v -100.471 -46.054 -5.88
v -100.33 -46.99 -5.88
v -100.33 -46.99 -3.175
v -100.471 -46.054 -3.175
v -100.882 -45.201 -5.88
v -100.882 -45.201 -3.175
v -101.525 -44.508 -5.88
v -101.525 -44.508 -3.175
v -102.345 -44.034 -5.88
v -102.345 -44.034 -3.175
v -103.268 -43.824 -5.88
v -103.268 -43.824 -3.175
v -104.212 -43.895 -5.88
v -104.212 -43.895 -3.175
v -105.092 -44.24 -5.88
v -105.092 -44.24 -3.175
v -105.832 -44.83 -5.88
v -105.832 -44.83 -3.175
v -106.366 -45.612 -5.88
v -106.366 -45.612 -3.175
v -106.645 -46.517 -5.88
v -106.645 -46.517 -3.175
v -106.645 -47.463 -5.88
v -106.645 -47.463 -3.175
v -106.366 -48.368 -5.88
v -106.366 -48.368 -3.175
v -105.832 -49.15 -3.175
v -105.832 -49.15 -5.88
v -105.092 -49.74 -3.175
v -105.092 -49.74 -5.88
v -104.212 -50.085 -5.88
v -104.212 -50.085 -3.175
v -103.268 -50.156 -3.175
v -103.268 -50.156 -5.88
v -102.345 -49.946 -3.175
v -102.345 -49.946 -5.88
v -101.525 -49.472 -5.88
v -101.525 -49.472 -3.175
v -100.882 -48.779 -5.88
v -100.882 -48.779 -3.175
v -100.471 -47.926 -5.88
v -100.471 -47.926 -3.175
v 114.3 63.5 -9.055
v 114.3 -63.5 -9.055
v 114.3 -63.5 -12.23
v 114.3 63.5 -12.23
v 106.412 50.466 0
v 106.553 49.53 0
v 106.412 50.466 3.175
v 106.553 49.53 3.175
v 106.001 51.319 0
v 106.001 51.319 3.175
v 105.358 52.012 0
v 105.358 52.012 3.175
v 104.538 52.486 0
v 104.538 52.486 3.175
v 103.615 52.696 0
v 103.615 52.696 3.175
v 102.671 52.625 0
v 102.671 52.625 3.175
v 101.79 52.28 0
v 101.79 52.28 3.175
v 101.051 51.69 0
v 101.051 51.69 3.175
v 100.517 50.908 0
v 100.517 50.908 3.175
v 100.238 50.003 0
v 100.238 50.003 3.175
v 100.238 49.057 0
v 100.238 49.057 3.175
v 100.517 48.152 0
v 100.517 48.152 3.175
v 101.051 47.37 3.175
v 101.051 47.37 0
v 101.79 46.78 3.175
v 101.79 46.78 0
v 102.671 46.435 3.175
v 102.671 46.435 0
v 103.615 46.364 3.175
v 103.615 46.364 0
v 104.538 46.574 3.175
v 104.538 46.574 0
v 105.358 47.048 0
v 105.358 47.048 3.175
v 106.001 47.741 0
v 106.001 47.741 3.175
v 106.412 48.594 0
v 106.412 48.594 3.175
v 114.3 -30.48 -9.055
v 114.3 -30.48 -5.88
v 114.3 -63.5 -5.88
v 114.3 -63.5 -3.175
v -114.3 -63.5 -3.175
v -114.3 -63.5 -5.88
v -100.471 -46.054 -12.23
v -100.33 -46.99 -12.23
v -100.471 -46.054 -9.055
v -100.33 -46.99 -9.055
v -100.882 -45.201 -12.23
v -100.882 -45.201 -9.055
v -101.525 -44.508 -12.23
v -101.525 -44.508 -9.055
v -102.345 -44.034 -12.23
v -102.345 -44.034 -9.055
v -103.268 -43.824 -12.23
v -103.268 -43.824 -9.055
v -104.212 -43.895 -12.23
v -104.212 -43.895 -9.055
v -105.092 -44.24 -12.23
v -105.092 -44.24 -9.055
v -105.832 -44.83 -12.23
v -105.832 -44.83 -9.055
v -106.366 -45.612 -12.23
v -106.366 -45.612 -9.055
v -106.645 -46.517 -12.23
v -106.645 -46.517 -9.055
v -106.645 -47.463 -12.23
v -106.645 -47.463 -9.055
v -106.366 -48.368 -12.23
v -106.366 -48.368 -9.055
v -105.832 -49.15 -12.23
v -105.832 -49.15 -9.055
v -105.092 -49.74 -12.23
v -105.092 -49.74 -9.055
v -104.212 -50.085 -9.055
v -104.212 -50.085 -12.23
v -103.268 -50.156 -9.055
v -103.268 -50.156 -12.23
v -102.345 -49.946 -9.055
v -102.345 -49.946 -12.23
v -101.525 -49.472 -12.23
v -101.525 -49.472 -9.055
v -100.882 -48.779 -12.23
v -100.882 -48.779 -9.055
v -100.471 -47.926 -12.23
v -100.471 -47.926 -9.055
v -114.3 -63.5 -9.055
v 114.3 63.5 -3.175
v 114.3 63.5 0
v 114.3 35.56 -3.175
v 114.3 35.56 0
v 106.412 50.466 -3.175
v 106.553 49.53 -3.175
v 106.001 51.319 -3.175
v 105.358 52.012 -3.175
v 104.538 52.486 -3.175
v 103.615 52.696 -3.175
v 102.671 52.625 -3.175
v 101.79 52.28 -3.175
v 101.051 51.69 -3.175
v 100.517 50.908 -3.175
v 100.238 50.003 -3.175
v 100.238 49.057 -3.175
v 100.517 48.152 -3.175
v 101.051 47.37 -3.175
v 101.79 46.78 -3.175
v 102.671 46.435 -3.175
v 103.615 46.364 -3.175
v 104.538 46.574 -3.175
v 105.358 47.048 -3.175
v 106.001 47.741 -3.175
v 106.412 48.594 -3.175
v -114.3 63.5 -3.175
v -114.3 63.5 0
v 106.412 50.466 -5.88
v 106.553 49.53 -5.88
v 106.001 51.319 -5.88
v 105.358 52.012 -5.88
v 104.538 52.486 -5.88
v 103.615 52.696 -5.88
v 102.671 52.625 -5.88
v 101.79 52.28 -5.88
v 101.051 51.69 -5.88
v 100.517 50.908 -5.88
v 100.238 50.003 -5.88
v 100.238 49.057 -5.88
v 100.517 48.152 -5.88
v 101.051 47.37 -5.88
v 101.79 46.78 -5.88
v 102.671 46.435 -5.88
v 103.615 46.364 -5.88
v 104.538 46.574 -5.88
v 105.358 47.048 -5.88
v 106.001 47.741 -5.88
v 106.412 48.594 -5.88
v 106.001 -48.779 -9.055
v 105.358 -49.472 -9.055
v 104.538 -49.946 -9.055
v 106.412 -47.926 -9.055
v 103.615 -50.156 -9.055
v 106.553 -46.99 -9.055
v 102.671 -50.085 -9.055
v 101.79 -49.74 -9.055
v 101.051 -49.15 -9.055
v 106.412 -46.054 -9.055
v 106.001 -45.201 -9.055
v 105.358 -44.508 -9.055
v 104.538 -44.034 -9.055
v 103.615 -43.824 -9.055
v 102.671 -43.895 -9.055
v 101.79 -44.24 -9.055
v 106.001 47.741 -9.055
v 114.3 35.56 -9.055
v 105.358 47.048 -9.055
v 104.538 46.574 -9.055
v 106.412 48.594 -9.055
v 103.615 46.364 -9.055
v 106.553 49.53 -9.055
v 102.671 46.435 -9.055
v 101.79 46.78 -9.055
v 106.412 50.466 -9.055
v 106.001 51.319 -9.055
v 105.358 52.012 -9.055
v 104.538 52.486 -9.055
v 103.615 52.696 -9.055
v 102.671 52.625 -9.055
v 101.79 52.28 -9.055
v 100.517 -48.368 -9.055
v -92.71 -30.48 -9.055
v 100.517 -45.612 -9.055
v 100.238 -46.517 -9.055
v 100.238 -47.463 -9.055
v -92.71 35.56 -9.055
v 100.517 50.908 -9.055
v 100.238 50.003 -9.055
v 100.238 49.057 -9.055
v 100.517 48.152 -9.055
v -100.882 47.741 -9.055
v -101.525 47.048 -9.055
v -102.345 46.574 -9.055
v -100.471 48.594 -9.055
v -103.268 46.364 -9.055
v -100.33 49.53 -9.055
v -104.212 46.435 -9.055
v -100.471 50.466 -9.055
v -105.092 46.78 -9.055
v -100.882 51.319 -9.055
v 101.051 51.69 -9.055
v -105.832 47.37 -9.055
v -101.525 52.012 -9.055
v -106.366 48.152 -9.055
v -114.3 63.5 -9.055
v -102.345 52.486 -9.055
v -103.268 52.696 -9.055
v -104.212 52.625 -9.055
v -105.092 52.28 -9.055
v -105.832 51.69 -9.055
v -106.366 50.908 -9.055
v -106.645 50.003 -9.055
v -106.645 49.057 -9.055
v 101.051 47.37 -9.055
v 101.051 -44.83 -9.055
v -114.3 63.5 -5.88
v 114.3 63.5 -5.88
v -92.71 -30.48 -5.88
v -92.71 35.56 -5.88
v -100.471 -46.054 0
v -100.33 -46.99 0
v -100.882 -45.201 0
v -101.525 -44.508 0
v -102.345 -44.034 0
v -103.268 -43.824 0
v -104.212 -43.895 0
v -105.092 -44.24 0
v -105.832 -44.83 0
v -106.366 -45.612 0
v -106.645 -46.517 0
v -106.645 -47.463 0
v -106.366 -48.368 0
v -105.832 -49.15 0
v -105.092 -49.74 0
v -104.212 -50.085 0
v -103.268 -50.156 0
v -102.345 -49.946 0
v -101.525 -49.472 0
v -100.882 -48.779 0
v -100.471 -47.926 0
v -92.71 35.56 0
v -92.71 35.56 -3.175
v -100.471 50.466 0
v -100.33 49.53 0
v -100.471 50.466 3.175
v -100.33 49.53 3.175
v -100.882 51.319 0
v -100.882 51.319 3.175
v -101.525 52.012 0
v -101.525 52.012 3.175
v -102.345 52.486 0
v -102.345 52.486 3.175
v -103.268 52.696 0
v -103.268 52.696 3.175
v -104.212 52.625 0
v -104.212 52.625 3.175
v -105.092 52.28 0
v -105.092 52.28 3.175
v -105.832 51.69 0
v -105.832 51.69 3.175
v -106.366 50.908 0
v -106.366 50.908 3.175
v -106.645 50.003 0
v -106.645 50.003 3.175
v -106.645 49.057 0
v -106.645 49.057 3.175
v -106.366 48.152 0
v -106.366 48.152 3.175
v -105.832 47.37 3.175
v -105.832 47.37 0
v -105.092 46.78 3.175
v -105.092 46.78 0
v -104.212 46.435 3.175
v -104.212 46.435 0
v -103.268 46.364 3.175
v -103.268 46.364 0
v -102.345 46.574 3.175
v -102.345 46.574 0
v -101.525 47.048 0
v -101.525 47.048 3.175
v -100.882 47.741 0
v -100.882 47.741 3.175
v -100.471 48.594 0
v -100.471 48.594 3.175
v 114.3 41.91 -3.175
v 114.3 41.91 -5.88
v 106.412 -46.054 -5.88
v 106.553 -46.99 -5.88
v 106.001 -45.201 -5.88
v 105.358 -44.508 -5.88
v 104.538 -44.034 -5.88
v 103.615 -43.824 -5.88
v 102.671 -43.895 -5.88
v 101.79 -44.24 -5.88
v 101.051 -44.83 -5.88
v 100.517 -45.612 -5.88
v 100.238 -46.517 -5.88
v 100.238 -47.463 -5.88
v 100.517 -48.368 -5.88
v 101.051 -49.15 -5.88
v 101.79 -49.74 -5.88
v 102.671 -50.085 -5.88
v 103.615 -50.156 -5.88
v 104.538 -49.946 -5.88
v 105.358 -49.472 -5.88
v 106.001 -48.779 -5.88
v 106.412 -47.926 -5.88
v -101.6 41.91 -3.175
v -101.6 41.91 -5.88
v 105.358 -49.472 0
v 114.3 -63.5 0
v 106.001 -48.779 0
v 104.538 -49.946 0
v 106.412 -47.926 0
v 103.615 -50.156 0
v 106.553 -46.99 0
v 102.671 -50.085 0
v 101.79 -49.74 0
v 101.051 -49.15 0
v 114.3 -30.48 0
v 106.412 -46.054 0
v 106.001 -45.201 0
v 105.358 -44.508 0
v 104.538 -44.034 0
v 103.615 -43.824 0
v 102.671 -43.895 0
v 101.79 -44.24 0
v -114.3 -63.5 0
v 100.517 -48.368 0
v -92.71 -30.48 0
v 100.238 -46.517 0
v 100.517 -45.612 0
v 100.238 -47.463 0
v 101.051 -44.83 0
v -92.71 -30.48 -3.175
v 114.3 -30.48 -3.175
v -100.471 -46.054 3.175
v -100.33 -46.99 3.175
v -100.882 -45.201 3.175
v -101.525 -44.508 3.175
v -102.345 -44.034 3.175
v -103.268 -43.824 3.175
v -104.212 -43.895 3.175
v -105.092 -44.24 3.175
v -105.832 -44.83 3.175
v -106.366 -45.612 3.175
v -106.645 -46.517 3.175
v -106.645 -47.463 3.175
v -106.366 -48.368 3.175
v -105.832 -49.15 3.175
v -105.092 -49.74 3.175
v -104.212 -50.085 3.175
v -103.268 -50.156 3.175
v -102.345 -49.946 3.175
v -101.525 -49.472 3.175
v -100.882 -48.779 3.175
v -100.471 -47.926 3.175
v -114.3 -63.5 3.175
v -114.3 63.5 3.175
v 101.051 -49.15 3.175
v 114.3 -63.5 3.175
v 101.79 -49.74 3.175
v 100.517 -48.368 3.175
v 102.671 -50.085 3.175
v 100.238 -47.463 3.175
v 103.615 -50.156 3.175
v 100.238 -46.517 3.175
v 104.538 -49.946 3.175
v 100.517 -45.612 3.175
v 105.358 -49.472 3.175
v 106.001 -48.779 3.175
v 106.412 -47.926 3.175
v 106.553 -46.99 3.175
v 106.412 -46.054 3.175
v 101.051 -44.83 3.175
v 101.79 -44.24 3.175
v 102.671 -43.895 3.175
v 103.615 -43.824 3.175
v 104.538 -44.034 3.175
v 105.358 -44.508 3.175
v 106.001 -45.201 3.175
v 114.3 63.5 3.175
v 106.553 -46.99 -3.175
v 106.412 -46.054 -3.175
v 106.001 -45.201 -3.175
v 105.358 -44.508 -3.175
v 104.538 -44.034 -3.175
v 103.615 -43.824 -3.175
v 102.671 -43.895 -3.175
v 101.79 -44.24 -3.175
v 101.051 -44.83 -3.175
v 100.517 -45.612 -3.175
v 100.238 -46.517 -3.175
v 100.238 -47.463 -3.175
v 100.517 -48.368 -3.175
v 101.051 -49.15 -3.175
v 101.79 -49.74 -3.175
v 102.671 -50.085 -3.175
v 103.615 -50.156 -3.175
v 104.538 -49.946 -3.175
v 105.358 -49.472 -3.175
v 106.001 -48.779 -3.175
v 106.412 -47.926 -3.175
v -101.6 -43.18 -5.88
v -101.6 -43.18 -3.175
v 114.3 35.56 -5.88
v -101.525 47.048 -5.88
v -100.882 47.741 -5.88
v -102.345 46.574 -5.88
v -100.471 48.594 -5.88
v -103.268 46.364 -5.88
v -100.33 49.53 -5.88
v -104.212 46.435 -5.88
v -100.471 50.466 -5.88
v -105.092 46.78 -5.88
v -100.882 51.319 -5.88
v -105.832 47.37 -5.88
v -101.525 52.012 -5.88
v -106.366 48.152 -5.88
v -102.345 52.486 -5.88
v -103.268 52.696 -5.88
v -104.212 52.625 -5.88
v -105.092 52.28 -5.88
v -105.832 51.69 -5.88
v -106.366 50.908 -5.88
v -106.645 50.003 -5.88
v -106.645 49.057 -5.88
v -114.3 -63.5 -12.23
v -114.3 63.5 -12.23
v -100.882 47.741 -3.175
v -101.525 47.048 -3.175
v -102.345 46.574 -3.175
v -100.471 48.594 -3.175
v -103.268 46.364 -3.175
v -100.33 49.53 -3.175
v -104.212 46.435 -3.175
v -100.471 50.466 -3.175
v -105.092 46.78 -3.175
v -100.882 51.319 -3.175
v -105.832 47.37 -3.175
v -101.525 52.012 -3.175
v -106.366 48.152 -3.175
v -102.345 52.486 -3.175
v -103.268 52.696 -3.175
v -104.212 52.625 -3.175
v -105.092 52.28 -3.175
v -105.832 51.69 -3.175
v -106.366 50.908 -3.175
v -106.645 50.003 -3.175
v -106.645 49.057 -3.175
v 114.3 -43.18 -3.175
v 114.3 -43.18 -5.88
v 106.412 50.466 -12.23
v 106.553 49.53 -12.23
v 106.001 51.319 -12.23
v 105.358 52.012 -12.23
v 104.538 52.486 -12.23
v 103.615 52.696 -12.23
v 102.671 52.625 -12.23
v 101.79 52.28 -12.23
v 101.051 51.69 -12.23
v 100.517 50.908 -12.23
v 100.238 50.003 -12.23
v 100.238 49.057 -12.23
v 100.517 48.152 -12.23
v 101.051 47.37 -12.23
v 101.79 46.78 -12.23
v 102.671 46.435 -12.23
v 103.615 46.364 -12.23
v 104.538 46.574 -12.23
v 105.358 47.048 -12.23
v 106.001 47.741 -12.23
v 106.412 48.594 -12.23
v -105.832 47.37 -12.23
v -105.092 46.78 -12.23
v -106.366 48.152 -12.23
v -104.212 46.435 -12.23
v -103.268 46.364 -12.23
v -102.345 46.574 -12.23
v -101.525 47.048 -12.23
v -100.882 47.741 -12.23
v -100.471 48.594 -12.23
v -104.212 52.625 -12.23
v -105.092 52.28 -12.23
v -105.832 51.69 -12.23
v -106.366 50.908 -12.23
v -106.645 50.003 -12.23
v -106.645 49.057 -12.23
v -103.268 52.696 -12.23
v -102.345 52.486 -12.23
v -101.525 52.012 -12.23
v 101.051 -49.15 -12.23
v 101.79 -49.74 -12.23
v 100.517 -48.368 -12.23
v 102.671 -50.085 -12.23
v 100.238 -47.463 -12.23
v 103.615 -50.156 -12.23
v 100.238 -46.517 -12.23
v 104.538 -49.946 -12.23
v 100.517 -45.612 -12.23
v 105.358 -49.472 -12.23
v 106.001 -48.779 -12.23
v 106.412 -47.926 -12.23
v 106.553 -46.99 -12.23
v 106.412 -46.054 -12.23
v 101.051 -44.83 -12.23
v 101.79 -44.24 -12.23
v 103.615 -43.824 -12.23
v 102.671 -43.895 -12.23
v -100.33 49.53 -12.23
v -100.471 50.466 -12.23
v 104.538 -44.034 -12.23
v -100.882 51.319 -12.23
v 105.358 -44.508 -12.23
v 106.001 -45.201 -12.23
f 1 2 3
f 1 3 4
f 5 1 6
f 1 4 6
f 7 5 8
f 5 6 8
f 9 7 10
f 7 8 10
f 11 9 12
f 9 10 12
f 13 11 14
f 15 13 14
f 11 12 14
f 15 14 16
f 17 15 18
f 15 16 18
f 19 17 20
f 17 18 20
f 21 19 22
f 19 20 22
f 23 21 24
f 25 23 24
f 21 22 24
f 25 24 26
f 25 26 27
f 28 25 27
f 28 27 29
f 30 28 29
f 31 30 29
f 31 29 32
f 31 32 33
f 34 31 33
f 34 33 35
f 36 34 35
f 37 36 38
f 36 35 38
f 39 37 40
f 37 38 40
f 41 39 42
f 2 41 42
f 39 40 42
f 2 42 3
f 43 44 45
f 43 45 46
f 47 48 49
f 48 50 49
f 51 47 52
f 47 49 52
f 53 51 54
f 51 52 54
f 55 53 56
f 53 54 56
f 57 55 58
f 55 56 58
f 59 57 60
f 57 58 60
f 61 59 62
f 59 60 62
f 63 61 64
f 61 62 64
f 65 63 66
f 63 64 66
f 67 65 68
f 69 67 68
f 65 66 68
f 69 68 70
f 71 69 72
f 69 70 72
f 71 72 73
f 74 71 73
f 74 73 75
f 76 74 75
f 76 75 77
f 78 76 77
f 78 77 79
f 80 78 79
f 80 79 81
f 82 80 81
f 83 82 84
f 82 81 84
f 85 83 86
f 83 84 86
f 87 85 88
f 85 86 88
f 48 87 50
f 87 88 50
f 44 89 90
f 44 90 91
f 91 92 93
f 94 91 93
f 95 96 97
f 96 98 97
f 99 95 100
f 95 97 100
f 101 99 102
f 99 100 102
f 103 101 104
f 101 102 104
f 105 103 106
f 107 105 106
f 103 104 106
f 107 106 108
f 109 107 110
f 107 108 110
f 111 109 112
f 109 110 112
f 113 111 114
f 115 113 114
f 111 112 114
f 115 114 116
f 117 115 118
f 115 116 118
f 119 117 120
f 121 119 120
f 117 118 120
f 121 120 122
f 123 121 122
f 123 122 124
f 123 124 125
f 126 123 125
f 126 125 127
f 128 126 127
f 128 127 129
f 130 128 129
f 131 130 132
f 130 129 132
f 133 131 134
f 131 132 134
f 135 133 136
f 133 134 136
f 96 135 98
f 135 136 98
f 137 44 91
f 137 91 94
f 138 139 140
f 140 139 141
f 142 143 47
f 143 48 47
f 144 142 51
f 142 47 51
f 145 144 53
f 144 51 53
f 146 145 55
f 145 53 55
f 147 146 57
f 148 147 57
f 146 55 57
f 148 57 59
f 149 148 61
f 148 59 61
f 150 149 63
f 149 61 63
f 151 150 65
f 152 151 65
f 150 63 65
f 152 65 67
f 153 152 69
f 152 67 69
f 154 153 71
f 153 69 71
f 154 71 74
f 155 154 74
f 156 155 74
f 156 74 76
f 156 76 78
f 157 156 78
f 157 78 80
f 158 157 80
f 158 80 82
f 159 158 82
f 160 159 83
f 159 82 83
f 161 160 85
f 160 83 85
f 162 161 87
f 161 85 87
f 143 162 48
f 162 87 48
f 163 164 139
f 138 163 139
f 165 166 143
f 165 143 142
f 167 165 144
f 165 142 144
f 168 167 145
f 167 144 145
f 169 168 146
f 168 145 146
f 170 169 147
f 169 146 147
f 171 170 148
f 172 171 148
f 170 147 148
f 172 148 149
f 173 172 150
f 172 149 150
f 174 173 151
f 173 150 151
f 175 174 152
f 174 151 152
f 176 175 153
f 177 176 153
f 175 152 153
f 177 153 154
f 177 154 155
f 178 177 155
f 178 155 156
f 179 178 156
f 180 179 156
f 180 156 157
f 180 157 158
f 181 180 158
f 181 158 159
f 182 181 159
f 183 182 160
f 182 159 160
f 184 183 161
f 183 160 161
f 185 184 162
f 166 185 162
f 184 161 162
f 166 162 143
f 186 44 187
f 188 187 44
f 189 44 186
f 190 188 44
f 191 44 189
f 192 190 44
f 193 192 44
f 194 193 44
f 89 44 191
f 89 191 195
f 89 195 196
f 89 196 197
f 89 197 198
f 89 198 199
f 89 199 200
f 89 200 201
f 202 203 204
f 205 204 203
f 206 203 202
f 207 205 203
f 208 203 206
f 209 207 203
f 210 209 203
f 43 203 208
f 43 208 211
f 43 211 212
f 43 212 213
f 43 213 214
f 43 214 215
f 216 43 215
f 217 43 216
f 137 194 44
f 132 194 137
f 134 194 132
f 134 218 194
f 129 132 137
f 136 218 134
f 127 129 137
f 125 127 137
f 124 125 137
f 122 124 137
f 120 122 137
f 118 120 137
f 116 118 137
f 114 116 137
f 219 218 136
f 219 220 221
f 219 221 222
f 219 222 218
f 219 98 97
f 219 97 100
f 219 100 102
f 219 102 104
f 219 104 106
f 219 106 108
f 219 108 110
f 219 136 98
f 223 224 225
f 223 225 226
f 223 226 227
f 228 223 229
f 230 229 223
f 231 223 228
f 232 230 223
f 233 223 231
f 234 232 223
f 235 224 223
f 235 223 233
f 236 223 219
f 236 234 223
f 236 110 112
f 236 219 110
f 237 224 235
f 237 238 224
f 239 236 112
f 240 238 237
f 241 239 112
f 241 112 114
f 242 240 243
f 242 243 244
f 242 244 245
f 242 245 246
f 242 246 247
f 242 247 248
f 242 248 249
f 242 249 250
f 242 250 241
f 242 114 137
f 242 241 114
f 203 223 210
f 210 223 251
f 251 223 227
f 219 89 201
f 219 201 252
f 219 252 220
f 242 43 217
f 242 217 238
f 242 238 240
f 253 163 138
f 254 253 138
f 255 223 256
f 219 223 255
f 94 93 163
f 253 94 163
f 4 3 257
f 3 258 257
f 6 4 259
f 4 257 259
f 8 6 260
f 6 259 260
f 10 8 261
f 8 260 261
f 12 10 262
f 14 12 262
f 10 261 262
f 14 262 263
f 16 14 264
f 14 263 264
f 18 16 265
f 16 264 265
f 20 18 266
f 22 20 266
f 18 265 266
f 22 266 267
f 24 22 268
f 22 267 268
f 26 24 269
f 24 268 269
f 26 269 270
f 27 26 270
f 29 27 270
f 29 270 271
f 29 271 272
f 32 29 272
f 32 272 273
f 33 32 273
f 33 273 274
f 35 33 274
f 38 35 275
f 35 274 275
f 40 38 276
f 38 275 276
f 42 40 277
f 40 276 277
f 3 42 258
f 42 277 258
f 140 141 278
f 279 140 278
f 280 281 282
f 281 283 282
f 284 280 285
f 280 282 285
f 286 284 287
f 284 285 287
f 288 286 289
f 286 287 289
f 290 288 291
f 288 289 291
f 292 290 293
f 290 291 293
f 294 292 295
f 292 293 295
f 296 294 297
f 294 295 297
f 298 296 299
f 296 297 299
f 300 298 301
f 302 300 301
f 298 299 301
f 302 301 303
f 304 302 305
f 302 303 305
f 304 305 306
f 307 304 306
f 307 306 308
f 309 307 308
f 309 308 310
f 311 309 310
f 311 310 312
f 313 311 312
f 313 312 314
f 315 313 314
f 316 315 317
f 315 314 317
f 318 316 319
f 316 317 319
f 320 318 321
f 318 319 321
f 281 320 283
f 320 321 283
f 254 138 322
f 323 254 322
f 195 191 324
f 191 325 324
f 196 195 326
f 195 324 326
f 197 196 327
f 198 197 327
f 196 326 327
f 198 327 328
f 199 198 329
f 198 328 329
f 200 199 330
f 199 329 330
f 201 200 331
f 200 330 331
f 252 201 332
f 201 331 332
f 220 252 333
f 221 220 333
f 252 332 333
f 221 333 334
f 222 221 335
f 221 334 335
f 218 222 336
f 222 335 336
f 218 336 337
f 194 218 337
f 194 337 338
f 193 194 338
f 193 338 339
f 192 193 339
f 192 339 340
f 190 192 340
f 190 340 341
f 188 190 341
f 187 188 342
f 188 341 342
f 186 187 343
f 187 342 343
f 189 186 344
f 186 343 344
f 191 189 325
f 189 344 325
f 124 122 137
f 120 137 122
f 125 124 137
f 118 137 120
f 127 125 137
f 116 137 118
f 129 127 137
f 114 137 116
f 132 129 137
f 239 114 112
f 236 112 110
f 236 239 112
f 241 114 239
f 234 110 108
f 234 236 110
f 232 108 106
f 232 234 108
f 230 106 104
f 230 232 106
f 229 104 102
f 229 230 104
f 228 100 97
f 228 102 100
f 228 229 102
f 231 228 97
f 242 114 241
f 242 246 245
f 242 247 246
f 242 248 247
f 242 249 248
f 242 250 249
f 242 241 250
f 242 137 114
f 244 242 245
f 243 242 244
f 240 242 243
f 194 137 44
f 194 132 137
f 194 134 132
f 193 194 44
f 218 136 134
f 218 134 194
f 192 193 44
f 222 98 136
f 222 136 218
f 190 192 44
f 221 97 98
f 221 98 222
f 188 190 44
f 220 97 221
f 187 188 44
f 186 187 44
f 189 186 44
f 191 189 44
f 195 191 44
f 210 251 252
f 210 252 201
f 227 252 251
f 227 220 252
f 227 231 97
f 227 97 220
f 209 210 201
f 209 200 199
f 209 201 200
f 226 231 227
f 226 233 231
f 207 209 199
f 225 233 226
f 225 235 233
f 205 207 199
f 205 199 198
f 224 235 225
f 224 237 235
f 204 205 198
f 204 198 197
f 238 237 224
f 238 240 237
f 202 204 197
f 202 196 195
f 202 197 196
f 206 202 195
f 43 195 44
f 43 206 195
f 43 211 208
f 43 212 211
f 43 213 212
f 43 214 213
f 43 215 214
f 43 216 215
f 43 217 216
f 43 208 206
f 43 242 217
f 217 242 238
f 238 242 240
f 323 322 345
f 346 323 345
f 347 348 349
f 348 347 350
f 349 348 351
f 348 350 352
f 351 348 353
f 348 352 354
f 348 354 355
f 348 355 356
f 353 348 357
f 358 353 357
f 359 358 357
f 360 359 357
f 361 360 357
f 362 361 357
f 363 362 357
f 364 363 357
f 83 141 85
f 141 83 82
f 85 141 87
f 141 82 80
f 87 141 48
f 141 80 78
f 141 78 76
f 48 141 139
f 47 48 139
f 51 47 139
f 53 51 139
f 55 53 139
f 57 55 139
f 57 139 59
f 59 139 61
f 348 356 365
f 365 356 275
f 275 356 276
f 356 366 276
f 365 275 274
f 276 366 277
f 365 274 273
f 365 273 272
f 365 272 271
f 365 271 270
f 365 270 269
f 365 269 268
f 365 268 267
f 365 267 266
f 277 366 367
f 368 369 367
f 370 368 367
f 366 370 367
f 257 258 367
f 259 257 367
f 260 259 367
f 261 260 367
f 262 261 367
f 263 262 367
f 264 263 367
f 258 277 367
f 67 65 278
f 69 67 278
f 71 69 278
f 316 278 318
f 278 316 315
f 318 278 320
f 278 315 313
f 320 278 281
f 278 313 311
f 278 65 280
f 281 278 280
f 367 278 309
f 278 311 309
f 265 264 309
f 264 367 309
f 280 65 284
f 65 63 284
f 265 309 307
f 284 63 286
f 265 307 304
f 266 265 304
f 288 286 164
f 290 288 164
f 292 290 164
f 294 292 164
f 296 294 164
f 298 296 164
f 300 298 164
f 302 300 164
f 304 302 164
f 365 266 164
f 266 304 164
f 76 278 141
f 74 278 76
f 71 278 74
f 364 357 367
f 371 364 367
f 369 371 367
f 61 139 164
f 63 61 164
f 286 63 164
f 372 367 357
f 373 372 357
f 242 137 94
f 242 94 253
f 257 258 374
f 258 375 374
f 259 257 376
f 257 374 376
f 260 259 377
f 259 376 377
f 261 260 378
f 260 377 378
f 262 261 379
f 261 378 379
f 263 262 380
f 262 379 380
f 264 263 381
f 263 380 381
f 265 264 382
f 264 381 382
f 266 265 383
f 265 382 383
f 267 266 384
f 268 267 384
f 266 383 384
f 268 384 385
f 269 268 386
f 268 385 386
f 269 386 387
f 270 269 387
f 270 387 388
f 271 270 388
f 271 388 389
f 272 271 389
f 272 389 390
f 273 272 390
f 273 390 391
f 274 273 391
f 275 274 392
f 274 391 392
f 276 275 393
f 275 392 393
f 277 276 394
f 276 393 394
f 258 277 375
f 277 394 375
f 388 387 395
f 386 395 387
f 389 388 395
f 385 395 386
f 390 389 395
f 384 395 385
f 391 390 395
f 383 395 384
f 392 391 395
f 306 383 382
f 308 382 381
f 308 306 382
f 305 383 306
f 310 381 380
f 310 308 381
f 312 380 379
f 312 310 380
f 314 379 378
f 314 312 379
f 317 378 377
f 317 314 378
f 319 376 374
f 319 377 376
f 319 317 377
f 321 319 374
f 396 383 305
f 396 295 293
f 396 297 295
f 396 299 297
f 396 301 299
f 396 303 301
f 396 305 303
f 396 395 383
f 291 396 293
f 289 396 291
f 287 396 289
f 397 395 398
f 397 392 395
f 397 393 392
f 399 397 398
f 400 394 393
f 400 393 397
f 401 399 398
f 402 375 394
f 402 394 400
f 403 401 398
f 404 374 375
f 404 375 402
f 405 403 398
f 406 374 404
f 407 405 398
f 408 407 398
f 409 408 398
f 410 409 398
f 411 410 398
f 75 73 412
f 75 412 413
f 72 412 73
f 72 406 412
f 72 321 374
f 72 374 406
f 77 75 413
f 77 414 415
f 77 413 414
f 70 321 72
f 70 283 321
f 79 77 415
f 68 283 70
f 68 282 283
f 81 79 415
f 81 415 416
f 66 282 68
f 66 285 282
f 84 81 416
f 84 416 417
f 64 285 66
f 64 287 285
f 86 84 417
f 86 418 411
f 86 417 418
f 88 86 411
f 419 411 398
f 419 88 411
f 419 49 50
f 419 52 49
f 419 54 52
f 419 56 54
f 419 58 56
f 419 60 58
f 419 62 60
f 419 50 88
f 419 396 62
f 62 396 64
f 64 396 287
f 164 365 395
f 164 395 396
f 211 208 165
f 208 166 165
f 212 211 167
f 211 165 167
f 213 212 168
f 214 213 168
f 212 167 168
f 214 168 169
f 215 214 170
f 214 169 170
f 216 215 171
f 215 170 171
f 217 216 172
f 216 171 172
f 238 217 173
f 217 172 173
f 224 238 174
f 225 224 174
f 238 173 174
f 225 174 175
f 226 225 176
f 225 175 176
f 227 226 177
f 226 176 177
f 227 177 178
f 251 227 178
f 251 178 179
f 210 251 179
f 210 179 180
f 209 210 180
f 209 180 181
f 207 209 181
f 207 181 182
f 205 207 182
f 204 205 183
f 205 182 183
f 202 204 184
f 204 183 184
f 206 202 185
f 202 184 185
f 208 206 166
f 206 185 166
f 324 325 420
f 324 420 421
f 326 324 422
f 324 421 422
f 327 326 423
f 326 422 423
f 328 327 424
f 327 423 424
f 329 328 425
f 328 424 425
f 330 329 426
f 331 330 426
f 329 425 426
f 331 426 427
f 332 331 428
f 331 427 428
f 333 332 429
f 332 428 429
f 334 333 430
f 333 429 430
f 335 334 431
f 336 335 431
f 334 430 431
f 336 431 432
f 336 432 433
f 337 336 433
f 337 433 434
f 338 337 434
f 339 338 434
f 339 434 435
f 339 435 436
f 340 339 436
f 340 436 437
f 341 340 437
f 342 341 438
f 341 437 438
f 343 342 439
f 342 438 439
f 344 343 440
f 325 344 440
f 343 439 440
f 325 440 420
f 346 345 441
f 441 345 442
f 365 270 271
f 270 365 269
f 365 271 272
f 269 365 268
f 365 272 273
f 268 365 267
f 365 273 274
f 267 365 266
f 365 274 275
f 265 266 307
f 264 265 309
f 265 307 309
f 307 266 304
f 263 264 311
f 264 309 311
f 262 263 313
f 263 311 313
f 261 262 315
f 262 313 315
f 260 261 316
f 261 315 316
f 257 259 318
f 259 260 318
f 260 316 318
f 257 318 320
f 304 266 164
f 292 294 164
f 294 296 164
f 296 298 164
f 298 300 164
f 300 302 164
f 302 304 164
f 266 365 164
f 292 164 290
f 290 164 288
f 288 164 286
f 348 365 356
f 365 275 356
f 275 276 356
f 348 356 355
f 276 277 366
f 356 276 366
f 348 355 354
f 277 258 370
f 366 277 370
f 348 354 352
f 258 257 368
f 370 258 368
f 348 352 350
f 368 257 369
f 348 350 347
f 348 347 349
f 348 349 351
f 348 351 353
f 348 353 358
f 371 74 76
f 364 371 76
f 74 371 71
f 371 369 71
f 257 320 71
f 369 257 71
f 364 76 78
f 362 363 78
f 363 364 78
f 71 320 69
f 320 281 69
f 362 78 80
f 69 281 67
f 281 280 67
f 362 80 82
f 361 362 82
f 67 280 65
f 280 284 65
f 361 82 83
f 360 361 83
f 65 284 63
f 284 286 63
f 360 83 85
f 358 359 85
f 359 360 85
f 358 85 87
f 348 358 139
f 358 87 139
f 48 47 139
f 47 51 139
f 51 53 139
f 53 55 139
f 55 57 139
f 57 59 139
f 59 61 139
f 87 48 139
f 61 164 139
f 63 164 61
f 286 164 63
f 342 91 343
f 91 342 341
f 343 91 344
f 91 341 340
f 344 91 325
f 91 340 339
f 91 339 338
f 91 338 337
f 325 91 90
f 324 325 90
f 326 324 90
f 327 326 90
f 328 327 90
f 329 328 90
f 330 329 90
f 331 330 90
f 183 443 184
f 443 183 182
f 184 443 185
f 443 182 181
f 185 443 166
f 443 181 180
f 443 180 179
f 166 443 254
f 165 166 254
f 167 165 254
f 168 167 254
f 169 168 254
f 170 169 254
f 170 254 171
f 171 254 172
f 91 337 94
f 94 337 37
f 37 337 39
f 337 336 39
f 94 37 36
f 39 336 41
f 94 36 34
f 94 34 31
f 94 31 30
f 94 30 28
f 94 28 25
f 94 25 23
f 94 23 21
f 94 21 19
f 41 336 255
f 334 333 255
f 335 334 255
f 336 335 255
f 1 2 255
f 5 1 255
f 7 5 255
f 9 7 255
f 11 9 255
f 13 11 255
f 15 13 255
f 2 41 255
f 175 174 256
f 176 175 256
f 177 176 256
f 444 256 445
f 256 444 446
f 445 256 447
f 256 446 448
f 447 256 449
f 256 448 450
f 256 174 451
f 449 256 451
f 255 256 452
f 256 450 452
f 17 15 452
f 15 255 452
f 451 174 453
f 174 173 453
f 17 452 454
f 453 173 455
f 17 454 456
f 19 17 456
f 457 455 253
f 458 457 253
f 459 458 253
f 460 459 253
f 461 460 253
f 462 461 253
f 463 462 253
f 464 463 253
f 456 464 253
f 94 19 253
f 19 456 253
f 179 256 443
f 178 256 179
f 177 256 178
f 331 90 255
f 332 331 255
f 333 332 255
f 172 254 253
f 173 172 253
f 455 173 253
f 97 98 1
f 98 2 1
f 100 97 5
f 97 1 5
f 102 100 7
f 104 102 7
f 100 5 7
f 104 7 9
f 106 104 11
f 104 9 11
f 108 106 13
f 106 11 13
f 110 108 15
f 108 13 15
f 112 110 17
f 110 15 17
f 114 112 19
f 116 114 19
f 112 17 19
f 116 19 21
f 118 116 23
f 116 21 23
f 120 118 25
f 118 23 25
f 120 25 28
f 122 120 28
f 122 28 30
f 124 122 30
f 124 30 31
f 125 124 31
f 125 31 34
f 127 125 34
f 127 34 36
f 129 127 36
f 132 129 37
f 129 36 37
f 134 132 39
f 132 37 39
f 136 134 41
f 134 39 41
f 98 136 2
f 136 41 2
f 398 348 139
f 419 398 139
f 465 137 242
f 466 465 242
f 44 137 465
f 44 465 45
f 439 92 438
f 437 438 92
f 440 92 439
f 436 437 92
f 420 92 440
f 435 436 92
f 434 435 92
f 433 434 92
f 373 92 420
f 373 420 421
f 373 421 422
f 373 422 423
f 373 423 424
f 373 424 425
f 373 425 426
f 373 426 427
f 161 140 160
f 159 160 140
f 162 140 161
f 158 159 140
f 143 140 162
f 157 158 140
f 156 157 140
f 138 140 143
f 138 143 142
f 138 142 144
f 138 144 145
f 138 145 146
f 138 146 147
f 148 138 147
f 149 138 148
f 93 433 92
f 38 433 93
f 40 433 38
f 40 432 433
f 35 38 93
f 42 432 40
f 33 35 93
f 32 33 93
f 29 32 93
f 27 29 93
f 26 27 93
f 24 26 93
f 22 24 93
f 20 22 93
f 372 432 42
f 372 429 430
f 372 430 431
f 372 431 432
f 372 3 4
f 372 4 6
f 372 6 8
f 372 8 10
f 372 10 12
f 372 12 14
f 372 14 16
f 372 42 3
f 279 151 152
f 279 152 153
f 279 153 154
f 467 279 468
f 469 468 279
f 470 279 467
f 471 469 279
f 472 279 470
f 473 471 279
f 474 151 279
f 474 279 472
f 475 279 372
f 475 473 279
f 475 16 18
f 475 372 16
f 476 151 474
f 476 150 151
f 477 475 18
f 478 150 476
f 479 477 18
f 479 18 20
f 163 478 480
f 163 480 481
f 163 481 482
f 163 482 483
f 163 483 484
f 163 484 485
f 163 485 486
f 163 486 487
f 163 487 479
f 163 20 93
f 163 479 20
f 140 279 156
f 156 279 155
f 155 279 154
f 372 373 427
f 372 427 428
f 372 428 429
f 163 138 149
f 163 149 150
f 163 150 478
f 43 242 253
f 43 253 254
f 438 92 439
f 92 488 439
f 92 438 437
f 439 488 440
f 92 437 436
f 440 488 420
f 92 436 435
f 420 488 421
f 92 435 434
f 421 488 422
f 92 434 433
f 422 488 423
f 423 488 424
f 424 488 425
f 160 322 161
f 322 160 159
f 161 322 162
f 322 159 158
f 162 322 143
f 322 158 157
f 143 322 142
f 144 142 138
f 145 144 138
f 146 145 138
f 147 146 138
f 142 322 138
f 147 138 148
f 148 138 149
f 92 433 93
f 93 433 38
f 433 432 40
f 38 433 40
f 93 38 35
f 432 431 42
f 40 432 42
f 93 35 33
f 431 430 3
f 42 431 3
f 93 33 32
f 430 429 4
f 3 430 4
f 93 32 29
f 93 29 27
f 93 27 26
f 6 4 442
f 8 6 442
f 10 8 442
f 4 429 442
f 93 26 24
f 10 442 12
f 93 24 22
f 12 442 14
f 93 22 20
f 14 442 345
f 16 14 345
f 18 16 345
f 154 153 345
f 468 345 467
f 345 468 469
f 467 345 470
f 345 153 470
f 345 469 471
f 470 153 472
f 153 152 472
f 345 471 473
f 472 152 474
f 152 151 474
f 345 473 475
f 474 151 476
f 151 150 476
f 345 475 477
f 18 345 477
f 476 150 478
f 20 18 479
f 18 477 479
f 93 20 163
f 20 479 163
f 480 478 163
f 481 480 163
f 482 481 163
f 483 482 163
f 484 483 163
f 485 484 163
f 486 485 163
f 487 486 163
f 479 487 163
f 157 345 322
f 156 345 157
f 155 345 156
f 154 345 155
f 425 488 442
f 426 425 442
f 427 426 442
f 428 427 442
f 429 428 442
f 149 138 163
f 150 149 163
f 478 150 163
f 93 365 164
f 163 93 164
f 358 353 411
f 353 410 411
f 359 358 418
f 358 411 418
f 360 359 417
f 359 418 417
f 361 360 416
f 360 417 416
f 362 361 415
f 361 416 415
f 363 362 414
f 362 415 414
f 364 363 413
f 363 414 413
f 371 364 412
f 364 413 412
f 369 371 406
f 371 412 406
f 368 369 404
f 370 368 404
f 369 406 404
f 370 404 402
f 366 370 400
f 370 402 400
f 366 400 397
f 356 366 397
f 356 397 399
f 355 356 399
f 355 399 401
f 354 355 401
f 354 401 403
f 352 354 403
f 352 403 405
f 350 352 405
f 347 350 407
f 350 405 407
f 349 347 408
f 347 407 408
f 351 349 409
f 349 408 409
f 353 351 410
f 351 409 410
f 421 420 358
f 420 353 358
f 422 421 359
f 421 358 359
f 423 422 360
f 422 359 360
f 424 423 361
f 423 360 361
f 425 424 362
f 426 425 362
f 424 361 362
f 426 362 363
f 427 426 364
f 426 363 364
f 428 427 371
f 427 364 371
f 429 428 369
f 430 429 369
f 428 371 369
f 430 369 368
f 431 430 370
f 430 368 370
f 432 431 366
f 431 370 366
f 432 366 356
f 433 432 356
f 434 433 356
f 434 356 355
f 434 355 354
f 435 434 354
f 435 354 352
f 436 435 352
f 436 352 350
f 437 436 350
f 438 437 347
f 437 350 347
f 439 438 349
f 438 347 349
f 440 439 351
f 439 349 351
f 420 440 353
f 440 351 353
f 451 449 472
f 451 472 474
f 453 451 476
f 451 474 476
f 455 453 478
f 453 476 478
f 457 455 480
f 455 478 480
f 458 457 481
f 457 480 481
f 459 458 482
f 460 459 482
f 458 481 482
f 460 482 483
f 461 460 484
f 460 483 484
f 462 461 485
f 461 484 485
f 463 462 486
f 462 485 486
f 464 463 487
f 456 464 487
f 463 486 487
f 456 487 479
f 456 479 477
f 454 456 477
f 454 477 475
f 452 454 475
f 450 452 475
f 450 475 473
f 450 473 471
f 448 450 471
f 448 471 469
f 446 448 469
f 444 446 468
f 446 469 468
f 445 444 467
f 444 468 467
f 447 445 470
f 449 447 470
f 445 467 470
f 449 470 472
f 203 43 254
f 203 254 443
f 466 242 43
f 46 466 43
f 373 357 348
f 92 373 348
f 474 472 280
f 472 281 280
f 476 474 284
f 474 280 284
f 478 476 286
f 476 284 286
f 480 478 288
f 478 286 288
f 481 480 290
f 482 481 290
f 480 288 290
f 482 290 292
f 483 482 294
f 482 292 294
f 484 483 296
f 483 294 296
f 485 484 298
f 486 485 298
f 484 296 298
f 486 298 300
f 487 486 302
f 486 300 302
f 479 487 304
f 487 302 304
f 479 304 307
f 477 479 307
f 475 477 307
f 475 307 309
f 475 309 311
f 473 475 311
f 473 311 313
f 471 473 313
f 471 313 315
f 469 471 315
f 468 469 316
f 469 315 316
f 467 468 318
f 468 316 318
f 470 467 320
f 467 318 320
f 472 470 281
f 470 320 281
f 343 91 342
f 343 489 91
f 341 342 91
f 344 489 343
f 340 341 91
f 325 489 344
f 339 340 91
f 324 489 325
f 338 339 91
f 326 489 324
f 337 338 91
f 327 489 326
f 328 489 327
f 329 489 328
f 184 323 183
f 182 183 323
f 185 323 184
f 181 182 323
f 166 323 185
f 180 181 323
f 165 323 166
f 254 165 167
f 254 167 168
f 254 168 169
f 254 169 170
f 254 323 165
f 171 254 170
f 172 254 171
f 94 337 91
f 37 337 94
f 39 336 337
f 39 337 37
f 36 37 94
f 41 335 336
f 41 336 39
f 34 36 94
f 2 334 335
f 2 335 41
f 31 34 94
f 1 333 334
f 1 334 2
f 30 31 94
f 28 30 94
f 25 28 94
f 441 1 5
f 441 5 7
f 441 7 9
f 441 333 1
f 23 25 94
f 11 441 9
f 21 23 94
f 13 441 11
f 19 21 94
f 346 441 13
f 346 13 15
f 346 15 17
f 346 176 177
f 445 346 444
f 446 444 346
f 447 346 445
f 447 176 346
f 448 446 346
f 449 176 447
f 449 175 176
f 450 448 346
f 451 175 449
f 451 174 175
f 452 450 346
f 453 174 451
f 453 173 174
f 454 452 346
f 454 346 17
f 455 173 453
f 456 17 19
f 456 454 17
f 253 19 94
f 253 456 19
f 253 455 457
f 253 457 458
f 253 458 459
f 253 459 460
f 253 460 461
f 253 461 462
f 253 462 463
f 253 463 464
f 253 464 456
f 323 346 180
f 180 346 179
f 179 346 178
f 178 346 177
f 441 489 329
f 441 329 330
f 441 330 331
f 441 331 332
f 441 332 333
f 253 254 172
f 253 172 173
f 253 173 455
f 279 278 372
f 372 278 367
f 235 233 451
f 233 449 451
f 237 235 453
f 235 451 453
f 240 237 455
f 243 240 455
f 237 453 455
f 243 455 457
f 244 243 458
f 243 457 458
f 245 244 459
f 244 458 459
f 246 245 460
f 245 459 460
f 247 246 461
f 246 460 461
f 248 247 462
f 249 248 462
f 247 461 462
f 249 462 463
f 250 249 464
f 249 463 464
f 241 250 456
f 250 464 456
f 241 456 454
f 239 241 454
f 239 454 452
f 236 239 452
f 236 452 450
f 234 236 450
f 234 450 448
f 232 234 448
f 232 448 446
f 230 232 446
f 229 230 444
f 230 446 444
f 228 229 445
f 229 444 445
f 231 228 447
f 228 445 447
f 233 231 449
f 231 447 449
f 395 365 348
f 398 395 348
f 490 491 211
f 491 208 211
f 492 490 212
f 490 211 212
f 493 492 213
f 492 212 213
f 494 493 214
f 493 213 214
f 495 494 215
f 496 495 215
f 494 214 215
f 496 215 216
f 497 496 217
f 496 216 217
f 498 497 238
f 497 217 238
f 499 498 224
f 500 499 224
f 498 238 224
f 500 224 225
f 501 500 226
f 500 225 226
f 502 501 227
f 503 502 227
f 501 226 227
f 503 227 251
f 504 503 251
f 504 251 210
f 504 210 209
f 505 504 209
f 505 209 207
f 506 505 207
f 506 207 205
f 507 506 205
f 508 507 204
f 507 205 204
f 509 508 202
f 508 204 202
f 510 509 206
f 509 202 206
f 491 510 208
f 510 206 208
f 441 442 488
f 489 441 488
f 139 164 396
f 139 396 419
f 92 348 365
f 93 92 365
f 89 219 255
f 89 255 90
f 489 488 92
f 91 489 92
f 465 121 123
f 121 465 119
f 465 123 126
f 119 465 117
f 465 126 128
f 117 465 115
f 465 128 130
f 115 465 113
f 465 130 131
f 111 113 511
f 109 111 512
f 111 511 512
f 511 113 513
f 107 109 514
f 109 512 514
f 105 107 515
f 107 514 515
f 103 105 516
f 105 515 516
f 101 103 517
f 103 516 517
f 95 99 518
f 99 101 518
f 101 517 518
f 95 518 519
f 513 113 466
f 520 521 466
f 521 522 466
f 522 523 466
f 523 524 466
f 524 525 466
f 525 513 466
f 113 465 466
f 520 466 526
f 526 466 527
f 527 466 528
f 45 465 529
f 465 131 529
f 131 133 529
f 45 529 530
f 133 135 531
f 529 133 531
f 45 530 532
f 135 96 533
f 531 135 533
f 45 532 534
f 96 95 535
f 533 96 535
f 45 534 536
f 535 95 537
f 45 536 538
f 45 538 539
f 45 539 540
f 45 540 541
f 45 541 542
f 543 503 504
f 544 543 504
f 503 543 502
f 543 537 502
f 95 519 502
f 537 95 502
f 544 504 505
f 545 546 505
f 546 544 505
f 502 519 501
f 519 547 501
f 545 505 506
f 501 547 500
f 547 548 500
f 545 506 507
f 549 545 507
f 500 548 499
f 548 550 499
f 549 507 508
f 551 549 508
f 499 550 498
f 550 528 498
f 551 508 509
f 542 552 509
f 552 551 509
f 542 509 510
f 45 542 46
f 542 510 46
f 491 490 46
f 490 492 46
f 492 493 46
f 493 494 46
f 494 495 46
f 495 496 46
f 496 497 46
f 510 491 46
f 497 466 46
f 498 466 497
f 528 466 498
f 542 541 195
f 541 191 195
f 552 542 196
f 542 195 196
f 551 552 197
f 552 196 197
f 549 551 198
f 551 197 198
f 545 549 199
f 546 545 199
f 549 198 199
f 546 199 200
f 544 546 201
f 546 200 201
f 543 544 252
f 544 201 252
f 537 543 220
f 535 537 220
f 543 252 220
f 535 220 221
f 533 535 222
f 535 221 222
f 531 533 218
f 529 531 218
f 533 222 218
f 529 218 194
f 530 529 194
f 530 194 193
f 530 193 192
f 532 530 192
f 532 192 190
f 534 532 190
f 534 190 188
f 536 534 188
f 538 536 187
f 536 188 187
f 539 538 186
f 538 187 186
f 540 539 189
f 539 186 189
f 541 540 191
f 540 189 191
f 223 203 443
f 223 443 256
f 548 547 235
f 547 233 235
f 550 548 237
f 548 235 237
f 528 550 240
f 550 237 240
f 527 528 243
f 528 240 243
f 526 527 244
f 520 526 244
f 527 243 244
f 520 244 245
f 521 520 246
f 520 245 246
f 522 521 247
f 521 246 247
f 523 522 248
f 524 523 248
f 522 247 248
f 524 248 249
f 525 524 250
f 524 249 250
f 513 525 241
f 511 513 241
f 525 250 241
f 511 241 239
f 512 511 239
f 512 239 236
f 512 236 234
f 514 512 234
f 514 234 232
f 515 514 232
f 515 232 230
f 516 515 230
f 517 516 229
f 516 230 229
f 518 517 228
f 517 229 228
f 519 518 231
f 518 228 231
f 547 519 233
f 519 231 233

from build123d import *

# Parameters (mm, degrees)
SKETCH1_W               = 228.6
SKETCH1_H               = 127
BOSS_EXTRUDE1_DEPTH     = 3.175
BOSS_EXTRUDE2_DEPTH     = 3.175
BOSS_EXTRUDE4_DEPTH     = 2.7051
SKETCH6_R               = 3.175
CUT_EXTRUDE1_DEPTH      = 4.175
CUT_EXTRUDE1_DEPTH_BACK = 13.2301


with BuildPart() as part:
    # Sketch1 → Boss-Extrude1 (new body)
    with BuildSketch(Plane.XY):
        Rectangle(SKETCH1_W, SKETCH1_H)
    extrude(amount=BOSS_EXTRUDE1_DEPTH)


with BuildPart() as body_2:
    # Sketch2 → Boss-Extrude2 (new body)
    with BuildSketch(Plane(origin=(0, 0, 0), x_dir=(-1, 0, 0), z_dir=(0, 0, -1))):
        Polygon((-114.3, 63.5), (-114.3, 35.56), (92.71, 35.56), (92.71, -30.48), (-114.3, -30.48), (-114.3, -63.5), (92.173439785, -63.5), (114.3, -63.5), (114.3, 63.5), align=None)
    extrude(amount=BOSS_EXTRUDE2_DEPTH)


with BuildPart() as body_3:
    # Sketch4 → Boss-Extrude4 (new body)
    with BuildSketch(Plane(origin=(0, 0, -3.175), x_dir=(-1, 0, 0), z_dir=(0, 0, -1))):
        Polygon((-114.3, 41.91), (101.6, 41.91), (101.6, -43.18), (-114.3, -43.18), (-114.3, -63.5), (114.3, -63.5), (114.3, 63.5), (-114.3, 63.5), align=None)
    extrude(amount=BOSS_EXTRUDE4_DEPTH)


with BuildPart() as body_4:
    # Mirror1: mirrored copy
    add(part.part.mirror(Plane(origin=(0, 0, -4.52755), x_dir=(1, 0, 0), z_dir=(0, 0, -1))))


with BuildPart() as body_5:
    # Mirror1 2: mirrored copy
    add(body_2.part.mirror(Plane(origin=(0, 0, -4.52755), x_dir=(1, 0, 0), z_dir=(0, 0, -1))))


with BuildPart() as cut_extrude1_tool:
    # Sketch6 → Cut-Extrude1 (new body, two sides)
    with BuildSketch(Plane.XY) as cut_extrude1_sk:
        with Locations((-103.505, 49.53)):
            Circle(SKETCH6_R)
        with Locations((-103.505, -46.99)):
            Circle(SKETCH6_R)
        with Locations((103.378, 49.53)):
            Circle(SKETCH6_R)
        with Locations((103.378, -46.99)):
            Circle(SKETCH6_R)
    extrude(amount=CUT_EXTRUDE1_DEPTH)
    extrude(cut_extrude1_sk.sketch, amount=-CUT_EXTRUDE1_DEPTH_BACK)


with BuildPart() as part_1:
    add(part.part)

    # Cut-Extrude1: cut by cut_extrude1_tool
    add(cut_extrude1_tool.part, mode=Mode.SUBTRACT)


with BuildPart() as body_2_1:
    add(body_2.part)

    # Cut-Extrude1: cut by cut_extrude1_tool
    add(cut_extrude1_tool.part, mode=Mode.SUBTRACT)


with BuildPart() as body_3_1:
    add(body_3.part)

    # Cut-Extrude1: cut by cut_extrude1_tool
    add(cut_extrude1_tool.part, mode=Mode.SUBTRACT)


with BuildPart() as body_4_1:
    add(body_4.part)

    # Cut-Extrude1: cut by cut_extrude1_tool
    add(cut_extrude1_tool.part, mode=Mode.SUBTRACT)


with BuildPart() as body_5_1:
    add(body_5.part)

    # Cut-Extrude1: cut by cut_extrude1_tool
    add(cut_extrude1_tool.part, mode=Mode.SUBTRACT)


solid = Compound([part_1.part, body_2_1.part, body_3_1.part, body_4_1.part, body_5_1.part])
